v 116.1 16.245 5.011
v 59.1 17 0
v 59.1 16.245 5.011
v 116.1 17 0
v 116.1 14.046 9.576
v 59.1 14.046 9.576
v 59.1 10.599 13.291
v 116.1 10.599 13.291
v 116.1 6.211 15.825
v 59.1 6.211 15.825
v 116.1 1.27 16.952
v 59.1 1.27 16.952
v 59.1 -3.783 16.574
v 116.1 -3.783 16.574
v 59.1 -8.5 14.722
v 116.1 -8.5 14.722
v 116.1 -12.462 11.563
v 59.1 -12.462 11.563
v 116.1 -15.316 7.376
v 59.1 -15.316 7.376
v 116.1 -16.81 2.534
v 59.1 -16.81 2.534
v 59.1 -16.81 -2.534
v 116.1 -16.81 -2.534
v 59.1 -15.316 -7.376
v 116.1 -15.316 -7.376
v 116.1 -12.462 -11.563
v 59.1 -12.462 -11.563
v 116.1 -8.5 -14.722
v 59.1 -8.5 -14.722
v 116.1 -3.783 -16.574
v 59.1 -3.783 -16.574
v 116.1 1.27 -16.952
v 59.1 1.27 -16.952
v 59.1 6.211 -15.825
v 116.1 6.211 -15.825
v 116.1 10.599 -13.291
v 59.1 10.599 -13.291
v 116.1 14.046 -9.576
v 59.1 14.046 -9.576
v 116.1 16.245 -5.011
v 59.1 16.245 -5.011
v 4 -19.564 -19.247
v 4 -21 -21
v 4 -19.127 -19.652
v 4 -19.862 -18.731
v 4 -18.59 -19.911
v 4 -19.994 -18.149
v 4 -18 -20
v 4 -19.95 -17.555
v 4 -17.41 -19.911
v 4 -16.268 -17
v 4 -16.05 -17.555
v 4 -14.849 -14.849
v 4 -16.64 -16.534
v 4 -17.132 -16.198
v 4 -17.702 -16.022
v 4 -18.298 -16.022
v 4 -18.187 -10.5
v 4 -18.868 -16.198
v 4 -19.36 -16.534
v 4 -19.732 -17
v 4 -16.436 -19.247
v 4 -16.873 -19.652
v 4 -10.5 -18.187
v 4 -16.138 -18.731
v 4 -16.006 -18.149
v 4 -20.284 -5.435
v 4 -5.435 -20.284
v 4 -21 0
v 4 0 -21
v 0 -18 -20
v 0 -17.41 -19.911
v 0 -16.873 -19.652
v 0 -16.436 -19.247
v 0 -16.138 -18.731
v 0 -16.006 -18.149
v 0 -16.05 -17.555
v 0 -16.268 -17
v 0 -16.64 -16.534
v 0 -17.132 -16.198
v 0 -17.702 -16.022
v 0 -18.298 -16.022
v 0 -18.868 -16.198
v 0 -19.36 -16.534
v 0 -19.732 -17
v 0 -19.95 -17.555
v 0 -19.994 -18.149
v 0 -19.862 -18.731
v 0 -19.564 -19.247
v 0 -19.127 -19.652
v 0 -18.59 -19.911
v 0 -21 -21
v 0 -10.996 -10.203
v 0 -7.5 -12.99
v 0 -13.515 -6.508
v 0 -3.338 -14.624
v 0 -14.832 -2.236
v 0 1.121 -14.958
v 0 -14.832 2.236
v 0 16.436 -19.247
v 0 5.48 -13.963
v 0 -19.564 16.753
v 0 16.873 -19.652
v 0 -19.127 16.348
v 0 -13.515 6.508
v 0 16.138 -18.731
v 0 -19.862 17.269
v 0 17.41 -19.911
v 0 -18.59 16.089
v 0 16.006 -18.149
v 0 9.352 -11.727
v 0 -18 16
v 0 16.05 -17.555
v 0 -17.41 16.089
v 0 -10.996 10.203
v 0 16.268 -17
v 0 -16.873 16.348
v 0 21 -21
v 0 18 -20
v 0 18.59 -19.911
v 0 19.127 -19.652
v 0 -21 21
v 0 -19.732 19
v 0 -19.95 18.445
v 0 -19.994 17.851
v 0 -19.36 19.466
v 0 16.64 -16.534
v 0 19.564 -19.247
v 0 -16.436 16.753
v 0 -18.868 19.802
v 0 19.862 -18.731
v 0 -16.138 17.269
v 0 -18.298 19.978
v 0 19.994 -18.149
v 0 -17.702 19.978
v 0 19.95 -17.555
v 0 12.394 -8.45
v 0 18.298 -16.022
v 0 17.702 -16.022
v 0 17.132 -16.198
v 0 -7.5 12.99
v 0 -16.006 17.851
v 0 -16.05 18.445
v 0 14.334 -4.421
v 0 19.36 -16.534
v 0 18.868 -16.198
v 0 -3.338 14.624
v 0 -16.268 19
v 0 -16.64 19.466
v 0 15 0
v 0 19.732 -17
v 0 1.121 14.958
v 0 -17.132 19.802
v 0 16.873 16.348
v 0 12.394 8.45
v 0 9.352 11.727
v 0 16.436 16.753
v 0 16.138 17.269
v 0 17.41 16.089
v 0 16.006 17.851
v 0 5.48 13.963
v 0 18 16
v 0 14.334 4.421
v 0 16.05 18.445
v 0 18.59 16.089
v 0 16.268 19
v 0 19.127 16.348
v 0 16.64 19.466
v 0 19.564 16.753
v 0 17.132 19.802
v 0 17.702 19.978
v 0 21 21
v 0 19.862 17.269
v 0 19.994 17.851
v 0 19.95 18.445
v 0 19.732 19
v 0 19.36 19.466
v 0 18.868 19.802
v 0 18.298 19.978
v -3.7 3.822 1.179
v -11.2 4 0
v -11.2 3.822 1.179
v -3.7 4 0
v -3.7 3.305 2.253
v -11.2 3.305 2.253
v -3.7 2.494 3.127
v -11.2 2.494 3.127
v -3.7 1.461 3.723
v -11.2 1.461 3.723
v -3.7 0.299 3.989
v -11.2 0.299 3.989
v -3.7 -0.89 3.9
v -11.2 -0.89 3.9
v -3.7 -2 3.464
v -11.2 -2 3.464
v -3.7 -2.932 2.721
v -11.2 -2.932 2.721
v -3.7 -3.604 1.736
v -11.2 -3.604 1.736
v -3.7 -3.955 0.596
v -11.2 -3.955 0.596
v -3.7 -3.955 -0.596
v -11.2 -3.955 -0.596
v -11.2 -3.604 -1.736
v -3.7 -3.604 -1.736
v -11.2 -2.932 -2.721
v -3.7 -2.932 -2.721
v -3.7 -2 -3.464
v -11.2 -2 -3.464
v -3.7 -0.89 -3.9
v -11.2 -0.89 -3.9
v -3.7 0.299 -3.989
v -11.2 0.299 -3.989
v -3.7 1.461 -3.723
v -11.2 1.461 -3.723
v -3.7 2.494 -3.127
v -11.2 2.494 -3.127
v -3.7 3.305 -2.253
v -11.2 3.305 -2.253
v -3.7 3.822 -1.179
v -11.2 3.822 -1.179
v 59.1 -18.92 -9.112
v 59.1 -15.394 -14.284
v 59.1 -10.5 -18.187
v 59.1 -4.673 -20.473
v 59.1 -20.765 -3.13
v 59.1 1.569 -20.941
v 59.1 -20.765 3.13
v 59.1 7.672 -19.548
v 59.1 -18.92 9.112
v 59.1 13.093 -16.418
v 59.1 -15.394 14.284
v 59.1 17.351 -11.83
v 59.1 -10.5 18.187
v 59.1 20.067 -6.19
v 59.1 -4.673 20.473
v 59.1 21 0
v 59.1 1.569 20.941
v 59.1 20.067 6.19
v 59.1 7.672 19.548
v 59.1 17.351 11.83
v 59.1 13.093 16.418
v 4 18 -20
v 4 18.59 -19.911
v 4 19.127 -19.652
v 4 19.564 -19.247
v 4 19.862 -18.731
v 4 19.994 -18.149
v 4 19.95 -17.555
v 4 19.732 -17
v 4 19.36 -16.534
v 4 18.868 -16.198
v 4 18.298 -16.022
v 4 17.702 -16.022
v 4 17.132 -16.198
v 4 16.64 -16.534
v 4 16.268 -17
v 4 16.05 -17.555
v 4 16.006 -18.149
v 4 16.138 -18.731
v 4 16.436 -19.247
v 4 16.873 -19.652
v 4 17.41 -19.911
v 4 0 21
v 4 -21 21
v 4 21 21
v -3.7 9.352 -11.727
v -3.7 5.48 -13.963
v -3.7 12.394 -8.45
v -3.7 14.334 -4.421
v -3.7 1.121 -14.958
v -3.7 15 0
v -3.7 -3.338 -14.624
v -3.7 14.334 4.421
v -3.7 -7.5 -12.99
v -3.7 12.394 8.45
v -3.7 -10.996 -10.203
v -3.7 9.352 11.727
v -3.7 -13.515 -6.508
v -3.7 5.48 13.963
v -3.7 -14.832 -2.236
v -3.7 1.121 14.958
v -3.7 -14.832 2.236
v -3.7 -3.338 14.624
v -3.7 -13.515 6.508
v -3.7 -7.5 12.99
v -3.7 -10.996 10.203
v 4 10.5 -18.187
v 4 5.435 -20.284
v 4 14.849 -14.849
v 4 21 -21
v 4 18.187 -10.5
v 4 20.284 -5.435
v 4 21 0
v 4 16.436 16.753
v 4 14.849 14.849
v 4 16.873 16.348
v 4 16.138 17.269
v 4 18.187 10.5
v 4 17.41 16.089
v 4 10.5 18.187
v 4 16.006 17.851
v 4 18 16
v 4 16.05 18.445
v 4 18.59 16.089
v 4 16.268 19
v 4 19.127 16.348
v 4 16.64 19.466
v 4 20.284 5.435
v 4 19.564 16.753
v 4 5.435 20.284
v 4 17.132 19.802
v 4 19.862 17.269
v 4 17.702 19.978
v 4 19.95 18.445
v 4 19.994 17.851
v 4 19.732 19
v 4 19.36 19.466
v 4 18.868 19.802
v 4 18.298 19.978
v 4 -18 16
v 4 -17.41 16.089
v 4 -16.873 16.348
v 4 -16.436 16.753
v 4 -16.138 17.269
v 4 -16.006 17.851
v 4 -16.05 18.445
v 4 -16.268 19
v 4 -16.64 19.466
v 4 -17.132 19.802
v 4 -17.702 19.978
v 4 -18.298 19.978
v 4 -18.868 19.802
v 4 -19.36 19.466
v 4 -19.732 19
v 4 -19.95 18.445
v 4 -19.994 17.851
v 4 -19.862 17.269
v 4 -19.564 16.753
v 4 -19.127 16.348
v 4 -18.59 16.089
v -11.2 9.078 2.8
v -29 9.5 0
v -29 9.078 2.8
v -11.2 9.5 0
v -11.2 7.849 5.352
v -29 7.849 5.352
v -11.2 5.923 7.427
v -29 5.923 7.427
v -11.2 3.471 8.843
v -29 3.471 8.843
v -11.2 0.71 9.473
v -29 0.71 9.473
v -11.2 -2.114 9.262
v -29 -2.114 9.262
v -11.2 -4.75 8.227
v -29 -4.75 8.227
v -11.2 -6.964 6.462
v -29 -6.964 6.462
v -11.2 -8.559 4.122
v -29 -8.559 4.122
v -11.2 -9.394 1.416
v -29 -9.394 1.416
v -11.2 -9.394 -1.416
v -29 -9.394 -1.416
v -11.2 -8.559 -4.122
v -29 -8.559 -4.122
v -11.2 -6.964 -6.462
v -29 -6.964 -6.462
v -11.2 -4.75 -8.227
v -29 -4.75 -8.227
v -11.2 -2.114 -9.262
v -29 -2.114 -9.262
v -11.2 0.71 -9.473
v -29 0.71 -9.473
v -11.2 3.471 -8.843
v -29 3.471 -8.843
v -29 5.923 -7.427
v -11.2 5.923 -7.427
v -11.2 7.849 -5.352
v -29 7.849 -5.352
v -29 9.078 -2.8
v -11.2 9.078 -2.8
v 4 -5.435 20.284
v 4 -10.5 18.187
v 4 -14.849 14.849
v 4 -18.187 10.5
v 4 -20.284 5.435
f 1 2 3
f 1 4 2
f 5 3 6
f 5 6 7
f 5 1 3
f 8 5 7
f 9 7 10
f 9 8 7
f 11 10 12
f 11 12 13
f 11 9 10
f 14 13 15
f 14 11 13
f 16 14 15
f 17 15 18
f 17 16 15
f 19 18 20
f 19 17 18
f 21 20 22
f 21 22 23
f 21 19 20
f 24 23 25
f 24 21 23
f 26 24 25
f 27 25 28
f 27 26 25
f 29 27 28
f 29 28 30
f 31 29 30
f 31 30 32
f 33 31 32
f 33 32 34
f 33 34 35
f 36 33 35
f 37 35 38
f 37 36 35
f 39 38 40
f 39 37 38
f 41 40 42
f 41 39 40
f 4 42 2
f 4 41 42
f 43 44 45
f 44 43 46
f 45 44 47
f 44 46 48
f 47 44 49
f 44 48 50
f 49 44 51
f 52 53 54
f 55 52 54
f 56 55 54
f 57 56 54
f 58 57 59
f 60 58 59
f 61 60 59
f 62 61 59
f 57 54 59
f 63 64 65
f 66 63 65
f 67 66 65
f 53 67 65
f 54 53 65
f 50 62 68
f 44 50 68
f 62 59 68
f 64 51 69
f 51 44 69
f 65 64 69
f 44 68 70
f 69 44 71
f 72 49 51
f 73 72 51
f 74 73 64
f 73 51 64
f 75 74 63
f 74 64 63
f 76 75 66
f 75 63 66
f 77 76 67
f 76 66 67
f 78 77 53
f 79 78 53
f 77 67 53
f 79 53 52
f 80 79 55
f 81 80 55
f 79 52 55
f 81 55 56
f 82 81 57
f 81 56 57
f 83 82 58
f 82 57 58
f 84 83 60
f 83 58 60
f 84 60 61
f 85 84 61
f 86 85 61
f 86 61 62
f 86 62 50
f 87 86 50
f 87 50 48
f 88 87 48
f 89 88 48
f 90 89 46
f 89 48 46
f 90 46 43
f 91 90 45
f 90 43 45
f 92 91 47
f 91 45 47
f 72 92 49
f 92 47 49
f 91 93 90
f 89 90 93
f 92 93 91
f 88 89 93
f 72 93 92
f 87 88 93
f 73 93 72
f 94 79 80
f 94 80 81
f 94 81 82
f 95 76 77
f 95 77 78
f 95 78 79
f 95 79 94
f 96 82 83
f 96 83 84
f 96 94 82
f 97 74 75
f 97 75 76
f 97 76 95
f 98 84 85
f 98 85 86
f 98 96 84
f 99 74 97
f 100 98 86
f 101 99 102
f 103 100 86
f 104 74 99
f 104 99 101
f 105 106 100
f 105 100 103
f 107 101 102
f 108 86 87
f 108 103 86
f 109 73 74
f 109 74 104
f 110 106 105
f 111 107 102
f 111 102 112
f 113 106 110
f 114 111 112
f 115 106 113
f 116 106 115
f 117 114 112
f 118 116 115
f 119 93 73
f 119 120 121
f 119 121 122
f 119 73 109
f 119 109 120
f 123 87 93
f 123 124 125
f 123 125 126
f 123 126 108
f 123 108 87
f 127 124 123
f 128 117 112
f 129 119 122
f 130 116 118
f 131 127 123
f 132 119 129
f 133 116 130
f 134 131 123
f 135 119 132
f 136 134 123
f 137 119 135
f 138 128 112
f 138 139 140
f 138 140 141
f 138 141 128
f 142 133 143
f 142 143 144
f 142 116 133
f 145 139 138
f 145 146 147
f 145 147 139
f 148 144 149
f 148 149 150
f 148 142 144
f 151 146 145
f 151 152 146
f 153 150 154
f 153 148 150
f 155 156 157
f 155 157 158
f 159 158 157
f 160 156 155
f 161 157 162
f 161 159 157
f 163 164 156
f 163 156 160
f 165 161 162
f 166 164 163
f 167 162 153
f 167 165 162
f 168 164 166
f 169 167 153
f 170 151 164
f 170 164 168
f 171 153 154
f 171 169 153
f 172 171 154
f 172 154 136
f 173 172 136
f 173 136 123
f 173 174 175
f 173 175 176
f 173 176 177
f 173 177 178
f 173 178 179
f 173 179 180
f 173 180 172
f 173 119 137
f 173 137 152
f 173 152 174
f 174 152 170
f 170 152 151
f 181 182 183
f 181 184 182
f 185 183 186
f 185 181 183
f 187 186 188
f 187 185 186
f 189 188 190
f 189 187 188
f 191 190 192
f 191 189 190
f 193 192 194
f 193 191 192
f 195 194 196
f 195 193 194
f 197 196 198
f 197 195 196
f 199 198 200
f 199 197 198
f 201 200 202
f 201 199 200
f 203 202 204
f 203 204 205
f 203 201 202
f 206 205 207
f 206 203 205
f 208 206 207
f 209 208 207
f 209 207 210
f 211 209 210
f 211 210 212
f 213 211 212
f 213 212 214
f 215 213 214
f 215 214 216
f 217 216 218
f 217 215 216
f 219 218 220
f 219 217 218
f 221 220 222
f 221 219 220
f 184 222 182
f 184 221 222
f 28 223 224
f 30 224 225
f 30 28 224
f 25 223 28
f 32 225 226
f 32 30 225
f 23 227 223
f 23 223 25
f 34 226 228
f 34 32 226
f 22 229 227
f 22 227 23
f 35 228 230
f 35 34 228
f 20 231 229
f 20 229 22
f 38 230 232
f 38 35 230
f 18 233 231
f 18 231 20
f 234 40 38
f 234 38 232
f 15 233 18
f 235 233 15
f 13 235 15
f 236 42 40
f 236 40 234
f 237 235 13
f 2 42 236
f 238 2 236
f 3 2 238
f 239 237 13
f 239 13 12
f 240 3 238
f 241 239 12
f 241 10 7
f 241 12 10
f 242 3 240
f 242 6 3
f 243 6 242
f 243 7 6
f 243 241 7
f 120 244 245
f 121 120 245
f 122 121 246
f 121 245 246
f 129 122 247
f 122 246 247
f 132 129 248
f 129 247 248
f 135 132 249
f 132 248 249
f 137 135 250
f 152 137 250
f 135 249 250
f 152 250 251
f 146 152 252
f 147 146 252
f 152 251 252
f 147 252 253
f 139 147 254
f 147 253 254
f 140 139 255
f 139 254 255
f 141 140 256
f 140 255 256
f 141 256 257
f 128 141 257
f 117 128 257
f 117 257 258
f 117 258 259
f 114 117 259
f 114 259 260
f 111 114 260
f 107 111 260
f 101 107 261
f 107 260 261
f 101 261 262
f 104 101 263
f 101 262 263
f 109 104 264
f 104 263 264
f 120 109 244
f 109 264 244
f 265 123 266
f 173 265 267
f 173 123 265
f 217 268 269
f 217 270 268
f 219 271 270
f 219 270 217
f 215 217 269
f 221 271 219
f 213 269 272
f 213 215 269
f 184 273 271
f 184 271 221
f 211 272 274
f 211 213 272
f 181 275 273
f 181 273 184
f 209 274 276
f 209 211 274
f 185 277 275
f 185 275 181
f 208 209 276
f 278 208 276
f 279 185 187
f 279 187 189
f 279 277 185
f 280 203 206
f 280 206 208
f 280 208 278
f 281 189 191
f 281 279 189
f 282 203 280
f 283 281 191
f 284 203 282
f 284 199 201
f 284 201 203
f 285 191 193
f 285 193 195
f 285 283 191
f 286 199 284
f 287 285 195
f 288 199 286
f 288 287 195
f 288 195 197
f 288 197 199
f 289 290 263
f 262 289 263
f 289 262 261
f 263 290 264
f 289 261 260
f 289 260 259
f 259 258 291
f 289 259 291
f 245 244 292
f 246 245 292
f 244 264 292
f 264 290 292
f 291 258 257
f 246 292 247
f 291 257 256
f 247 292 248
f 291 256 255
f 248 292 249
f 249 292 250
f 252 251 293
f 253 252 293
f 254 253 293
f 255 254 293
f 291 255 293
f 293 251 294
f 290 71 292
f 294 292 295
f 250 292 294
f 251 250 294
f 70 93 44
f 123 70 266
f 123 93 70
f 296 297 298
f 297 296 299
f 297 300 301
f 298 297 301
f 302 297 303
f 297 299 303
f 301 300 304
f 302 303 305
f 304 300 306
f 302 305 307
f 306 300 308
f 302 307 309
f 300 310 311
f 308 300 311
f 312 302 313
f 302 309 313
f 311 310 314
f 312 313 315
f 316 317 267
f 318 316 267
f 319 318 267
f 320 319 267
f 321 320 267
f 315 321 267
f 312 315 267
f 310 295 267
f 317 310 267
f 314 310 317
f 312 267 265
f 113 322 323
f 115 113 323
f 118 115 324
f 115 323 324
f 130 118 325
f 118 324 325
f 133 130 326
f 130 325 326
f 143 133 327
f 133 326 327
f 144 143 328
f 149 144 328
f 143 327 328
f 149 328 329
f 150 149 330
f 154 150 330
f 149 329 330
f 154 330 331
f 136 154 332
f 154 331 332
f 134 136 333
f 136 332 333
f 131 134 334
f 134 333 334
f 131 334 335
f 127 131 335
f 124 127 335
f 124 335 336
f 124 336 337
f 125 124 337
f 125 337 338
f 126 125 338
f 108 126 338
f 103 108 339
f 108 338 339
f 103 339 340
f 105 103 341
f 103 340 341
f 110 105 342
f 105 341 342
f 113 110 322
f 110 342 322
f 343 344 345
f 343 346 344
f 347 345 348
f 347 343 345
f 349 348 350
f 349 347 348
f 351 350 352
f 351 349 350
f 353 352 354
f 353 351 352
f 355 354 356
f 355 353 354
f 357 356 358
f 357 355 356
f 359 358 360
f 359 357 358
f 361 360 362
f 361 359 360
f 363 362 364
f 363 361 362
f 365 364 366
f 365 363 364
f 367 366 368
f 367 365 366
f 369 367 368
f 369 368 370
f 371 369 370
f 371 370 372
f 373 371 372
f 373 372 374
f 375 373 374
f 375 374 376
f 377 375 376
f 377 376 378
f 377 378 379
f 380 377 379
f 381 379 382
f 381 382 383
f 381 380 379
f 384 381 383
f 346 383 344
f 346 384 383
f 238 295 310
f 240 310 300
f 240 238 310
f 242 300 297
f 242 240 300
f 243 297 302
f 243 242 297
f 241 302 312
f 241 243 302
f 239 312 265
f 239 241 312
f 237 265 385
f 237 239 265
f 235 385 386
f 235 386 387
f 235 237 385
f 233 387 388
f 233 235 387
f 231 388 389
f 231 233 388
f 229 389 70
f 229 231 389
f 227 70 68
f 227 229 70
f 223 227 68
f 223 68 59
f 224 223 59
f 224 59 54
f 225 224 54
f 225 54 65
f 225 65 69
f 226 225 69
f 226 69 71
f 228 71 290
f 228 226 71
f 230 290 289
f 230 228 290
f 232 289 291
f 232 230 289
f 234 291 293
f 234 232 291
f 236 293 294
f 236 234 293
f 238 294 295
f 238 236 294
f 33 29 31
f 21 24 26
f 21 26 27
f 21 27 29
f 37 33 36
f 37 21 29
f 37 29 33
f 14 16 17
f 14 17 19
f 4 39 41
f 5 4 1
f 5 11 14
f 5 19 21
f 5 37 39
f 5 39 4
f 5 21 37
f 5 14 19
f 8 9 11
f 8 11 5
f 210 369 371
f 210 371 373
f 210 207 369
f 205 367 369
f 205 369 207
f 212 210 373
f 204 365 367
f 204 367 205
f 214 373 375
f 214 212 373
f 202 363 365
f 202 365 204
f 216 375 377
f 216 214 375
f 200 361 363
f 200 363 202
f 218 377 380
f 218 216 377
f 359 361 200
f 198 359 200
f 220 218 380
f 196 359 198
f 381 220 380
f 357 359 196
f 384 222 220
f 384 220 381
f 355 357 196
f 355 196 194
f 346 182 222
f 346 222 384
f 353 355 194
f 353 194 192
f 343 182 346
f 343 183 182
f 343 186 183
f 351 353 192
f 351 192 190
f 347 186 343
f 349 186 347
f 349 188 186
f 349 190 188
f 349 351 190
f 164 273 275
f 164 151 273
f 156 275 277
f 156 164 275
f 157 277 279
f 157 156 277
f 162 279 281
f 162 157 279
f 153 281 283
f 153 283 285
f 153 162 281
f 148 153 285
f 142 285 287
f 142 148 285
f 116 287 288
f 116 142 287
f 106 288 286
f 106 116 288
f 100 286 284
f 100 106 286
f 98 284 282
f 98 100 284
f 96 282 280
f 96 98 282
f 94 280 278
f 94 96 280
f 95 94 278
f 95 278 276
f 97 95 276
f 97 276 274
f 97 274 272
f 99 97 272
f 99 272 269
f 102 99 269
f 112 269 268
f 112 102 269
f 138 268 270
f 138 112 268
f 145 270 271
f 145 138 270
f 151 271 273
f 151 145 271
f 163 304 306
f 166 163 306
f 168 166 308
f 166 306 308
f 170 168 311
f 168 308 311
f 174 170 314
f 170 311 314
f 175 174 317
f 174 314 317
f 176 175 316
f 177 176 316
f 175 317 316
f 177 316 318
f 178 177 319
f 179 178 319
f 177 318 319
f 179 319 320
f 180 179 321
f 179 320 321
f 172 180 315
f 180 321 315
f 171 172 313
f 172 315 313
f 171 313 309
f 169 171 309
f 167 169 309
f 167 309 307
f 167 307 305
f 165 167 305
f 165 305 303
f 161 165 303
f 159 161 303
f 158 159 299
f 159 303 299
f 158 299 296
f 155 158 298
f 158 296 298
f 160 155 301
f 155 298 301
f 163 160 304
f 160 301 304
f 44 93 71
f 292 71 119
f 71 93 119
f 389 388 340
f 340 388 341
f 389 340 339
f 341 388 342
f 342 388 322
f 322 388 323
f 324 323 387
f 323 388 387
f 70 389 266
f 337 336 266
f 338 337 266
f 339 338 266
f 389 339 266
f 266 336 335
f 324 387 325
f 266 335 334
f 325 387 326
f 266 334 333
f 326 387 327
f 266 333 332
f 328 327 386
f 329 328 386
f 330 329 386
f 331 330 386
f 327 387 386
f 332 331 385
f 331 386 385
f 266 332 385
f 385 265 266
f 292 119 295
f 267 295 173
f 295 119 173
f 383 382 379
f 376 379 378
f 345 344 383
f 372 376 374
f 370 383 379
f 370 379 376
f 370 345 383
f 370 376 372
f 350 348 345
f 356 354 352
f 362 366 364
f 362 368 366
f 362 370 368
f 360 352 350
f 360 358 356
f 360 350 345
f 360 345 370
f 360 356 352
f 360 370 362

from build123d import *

# Parameters (mm, degrees)
ESBO_O2_W                = 42
ESBO_O2_H                = 42
RESSALTO_EXTRUS_O1_DEPTH = 4
ESBO_O3_R                = 2
CORTE_EXTRUS_O1_DEPTH    = 4


with BuildPart() as part:
    # Esboço1 → Revolução1 (revolve)
    with BuildSketch(Plane.XY):
        Polygon((-29, 0), (-29, 9.5), (-11.2, 9.5), (-11.2, 4), (-3.7, 4), (-3.7, 15), (0, 15), (0, 21), (59.1, 21), (59.1, 17), (116.1, 17), (116.1, 0), align=None)
    revolve(axis=Axis((0, 0, 0), (1, 0, 0)))

    # Esboço2 → Ressalto-extrusão1 (add)
    with BuildSketch(Plane.ZY):
        Rectangle(ESBO_O2_W, ESBO_O2_H)
    extrude(amount=-RESSALTO_EXTRUS_O1_DEPTH)

    # Esboço3 → Corte-extrusão1 (cut)
    with BuildSketch(Plane(origin=(4, 0, 0), x_dir=(0, 0, -1), z_dir=(1, 0, 0))):
        with Locations((-18, 18)):
            Circle(ESBO_O3_R)
        with Locations((-18, -18)):
            Circle(ESBO_O3_R)
        with Locations((18, -18)):
            Circle(ESBO_O3_R)
        with Locations((18, 18)):
            Circle(ESBO_O3_R)
    extrude(amount=-CORTE_EXTRUS_O1_DEPTH, mode=Mode.SUBTRACT)


solid = part.part
